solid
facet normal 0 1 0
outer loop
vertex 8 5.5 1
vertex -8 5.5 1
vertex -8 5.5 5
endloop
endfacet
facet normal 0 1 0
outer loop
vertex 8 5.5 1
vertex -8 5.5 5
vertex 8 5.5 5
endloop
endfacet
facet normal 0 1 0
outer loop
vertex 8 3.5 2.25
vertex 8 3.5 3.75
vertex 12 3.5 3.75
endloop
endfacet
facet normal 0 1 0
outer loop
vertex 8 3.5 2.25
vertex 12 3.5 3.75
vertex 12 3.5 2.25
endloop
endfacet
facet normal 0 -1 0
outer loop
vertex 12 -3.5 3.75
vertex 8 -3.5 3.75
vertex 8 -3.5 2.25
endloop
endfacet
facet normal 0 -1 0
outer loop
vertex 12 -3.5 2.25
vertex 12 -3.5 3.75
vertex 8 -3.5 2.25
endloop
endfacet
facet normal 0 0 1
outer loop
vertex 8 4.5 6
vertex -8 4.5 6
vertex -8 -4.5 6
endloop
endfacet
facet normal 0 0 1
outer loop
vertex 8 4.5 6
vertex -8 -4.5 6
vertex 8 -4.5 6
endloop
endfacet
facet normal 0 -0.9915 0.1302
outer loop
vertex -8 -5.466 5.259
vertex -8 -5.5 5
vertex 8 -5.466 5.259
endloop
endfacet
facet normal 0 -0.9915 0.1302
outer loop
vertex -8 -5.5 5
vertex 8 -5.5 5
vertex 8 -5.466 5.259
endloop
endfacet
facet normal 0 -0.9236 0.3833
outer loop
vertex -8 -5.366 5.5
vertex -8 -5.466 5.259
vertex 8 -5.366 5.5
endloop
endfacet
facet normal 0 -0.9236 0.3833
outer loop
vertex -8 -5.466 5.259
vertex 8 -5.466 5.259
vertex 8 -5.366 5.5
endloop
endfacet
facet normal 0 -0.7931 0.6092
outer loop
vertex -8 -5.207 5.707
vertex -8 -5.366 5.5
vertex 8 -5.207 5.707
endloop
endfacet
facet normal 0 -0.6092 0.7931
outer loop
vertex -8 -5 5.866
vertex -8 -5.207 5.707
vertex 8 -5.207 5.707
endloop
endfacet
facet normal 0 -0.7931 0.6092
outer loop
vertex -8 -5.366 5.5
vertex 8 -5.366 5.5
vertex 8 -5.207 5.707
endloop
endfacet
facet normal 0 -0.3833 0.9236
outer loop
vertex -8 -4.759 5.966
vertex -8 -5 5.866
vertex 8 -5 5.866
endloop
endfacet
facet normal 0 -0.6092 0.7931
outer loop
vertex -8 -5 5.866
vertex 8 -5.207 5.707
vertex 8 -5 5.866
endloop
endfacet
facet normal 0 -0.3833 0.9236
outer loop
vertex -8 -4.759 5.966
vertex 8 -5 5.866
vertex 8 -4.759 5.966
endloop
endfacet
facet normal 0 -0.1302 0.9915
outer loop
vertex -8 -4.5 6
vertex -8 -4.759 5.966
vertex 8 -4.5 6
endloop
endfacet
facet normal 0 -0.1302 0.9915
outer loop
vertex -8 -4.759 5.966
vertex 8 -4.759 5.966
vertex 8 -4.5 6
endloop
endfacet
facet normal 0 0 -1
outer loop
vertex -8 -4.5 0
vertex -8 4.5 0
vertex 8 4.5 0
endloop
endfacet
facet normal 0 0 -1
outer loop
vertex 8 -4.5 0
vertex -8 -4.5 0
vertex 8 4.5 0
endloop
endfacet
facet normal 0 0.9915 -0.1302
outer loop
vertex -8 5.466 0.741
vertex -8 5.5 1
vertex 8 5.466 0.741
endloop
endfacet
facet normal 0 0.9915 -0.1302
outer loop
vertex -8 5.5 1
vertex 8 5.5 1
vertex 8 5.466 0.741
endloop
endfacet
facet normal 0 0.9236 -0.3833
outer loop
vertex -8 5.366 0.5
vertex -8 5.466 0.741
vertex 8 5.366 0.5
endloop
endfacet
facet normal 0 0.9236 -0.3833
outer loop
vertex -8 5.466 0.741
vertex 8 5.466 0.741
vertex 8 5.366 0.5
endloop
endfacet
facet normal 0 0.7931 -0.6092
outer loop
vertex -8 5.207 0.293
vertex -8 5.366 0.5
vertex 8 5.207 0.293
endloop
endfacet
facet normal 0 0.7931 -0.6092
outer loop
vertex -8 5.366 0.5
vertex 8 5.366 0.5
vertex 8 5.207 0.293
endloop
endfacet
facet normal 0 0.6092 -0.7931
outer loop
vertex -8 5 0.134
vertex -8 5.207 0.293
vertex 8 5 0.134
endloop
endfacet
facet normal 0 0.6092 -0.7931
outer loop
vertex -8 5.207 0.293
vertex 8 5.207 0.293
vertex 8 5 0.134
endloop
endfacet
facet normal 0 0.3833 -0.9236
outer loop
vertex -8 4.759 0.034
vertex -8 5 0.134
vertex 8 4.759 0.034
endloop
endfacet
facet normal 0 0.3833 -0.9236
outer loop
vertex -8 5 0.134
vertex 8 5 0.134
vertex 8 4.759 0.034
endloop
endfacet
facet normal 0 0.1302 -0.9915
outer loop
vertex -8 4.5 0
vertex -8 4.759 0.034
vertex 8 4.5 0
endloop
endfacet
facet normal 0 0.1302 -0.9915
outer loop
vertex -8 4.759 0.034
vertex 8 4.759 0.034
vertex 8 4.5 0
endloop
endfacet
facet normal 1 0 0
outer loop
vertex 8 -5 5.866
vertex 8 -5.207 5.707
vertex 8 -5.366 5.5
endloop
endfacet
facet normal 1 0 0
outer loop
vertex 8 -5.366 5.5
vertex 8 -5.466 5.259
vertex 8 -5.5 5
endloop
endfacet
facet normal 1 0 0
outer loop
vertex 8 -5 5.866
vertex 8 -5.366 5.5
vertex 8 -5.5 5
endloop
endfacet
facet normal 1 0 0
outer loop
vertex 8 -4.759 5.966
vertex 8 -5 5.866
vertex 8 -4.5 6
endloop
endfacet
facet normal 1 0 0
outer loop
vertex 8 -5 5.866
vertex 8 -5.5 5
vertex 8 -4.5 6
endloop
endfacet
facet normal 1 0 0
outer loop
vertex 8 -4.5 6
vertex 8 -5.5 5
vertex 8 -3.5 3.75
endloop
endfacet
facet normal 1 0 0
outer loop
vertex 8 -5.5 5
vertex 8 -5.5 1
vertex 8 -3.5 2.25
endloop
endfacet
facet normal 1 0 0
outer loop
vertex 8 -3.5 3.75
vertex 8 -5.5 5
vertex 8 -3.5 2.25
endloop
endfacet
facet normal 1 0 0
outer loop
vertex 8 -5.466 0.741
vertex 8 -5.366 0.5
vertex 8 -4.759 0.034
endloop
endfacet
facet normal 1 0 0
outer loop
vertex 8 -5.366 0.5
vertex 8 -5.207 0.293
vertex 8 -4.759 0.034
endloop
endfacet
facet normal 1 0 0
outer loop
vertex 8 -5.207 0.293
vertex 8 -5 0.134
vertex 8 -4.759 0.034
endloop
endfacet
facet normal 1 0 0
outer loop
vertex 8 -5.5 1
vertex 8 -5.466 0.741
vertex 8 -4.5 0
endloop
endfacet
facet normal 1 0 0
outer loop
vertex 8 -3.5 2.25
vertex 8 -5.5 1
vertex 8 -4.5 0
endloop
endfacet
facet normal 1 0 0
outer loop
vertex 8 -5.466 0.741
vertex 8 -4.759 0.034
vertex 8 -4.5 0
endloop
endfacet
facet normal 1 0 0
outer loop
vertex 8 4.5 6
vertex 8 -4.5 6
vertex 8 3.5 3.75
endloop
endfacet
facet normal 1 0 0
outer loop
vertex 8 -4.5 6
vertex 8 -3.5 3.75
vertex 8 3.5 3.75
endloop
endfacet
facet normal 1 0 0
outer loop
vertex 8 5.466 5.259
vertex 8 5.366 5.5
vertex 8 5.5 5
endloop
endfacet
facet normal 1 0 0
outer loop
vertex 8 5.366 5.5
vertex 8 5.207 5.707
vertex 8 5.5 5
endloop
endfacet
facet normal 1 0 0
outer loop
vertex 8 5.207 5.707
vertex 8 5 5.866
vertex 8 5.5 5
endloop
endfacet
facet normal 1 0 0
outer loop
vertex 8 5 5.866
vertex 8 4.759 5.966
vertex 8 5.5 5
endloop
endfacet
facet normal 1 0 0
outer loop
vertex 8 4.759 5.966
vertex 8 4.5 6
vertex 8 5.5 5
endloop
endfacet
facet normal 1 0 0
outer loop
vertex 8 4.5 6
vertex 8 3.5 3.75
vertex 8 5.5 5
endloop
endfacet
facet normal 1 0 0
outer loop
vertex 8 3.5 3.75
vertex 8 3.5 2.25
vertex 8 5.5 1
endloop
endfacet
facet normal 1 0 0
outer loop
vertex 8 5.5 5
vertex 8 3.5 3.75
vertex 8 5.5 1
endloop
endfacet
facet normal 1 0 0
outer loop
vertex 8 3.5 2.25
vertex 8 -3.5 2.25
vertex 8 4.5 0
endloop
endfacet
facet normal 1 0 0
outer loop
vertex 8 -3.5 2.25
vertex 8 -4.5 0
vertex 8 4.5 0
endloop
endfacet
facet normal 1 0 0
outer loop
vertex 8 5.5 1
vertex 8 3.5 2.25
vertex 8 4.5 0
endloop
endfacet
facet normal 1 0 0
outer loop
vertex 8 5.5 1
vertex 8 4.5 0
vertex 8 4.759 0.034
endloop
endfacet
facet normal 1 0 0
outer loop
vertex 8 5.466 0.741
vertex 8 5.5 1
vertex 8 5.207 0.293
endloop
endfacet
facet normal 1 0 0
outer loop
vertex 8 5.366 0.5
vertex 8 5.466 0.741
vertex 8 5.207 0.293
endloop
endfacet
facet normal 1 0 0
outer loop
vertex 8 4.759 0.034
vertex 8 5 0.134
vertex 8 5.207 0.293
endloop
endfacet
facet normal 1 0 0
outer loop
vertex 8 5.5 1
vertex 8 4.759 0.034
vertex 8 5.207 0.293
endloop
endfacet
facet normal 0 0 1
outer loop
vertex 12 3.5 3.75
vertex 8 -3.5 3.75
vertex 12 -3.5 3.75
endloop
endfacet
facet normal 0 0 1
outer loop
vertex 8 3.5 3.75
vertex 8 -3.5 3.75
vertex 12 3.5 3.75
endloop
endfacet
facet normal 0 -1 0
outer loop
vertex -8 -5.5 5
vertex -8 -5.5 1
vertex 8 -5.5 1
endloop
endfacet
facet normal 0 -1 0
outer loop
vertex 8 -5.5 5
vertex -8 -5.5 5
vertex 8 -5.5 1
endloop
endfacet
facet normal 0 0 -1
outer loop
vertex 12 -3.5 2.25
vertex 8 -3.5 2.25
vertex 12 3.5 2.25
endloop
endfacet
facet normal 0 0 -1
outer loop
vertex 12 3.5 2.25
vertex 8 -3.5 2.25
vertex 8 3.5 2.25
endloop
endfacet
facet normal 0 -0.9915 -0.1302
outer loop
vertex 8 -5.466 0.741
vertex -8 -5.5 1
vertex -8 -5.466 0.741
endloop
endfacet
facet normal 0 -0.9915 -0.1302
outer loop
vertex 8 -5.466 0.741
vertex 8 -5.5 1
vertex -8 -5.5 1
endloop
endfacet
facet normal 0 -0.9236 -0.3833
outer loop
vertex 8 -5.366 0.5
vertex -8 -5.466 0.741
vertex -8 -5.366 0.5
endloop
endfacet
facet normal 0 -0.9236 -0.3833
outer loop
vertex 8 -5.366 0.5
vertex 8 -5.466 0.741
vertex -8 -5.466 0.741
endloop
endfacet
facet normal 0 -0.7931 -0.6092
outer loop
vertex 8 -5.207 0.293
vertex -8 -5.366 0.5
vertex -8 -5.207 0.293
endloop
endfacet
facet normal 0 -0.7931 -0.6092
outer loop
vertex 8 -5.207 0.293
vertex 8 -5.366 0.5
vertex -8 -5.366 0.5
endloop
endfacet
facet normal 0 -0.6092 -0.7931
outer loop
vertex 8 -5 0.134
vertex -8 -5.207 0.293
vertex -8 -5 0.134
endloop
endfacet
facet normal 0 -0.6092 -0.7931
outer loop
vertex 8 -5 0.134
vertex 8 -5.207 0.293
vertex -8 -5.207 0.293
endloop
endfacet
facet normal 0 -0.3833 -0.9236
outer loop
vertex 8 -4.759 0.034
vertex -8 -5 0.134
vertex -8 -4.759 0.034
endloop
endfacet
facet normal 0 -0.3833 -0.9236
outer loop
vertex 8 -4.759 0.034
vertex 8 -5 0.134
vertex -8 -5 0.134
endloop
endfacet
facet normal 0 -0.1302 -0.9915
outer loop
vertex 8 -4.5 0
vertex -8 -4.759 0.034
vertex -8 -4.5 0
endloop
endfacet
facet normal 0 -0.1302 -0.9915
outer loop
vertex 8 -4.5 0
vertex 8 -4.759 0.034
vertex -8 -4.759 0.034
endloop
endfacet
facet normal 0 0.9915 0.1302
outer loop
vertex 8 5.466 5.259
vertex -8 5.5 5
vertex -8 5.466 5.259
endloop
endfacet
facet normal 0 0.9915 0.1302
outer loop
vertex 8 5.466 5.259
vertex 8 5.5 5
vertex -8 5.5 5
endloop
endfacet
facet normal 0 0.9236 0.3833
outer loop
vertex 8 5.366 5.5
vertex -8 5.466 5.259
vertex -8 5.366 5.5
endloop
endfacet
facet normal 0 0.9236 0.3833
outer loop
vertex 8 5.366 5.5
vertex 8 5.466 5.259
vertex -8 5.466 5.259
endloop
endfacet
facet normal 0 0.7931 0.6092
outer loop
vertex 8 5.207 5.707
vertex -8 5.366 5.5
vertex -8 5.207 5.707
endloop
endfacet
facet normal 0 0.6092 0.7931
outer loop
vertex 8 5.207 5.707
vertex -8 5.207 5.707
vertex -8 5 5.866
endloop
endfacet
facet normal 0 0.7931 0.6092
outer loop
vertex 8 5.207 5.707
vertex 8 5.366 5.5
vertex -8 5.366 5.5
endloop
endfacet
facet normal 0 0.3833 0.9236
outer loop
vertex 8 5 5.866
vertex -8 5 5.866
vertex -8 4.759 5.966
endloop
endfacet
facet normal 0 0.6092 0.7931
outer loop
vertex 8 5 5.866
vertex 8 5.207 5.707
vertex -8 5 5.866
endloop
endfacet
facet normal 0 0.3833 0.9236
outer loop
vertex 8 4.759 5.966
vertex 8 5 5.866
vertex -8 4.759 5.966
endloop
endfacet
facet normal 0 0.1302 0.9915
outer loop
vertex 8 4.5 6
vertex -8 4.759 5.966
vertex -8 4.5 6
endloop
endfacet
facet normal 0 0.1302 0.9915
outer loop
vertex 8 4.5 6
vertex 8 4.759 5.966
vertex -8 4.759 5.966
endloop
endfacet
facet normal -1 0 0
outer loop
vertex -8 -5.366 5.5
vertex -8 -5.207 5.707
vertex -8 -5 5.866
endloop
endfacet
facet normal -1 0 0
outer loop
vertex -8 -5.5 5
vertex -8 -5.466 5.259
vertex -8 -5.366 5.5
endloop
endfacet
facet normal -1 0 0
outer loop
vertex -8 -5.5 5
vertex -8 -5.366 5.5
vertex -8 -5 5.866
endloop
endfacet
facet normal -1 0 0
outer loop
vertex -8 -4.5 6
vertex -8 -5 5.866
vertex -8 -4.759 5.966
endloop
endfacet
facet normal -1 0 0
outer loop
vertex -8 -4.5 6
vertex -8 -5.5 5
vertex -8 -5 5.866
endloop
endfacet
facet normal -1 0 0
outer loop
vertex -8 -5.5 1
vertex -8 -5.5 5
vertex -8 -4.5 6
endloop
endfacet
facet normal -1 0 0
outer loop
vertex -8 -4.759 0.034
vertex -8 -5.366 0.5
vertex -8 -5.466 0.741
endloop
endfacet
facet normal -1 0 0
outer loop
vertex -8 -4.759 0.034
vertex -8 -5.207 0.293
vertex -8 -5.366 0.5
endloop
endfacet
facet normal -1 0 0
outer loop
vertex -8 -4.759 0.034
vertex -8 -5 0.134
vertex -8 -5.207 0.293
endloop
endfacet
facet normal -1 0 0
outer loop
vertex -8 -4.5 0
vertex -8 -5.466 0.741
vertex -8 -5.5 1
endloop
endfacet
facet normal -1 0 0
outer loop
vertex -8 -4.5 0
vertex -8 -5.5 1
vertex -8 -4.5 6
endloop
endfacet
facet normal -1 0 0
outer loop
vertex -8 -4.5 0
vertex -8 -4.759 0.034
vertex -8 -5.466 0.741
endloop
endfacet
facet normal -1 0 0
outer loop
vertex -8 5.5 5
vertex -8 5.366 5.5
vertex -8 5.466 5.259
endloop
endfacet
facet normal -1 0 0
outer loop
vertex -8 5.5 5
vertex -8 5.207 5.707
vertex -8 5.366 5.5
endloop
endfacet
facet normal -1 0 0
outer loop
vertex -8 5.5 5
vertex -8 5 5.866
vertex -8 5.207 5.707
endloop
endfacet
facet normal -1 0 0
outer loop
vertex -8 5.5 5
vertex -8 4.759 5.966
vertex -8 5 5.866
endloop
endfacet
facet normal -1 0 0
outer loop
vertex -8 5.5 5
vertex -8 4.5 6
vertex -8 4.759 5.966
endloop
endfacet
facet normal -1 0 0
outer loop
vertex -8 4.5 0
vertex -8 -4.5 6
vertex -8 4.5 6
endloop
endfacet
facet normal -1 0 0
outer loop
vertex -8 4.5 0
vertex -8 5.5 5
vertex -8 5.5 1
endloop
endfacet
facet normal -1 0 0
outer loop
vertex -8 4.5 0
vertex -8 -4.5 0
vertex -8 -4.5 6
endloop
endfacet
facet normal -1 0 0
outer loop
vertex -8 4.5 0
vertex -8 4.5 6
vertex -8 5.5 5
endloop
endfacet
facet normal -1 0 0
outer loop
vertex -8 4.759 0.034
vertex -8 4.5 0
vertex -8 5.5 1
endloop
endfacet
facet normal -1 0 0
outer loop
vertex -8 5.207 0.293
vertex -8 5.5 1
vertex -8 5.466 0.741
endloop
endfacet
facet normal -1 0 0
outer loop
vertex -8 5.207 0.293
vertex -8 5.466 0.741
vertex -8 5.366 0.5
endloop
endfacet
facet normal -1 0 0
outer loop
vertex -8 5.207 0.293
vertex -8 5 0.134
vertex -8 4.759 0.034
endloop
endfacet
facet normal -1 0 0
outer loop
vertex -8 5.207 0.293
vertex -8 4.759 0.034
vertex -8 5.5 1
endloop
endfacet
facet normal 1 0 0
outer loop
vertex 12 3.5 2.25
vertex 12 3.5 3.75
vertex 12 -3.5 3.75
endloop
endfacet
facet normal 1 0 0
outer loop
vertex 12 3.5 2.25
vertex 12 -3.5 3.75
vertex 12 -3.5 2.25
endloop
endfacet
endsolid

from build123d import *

# Parameters (mm, degrees)
SKICA1_W                = 16
SKICA1_H                = 11
P_IDAT_VYSUNUT_M1_DEPTH = 6
ZAOBLIT1_R              = 1
SKICA2_W                = 1.5
SKICA2_H                = 7
P_IDAT_VYSUNUT_M2_DEPTH = 4


with BuildPart() as part:
    # Skica1 → Přidat vysunutím1 (new body)
    with BuildSketch(Plane.XY):
        Rectangle(SKICA1_W, SKICA1_H)
    extrude(amount=P_IDAT_VYSUNUT_M1_DEPTH)

    # Zaoblit1
    zaoblit1_edges = [part.edges().sort_by_distance(p)[0] for p in [
        (0, -5.5, 6),
        (0, -5.5, 0),
        (0, 5.5, 0),
        (0, 5.5, 6),
    ]]
    fillet(zaoblit1_edges, radius=ZAOBLIT1_R)

    # Skica2 → Přidat vysunutím2 (add)
    with BuildSketch(Plane(origin=(8, 0, 0), x_dir=(0, 0, -1), z_dir=(1, 0, 0))):
        with Locations((-3, 0)):
            Rectangle(SKICA2_W, SKICA2_H)
    extrude(amount=P_IDAT_VYSUNUT_M2_DEPTH)


solid = part.part
